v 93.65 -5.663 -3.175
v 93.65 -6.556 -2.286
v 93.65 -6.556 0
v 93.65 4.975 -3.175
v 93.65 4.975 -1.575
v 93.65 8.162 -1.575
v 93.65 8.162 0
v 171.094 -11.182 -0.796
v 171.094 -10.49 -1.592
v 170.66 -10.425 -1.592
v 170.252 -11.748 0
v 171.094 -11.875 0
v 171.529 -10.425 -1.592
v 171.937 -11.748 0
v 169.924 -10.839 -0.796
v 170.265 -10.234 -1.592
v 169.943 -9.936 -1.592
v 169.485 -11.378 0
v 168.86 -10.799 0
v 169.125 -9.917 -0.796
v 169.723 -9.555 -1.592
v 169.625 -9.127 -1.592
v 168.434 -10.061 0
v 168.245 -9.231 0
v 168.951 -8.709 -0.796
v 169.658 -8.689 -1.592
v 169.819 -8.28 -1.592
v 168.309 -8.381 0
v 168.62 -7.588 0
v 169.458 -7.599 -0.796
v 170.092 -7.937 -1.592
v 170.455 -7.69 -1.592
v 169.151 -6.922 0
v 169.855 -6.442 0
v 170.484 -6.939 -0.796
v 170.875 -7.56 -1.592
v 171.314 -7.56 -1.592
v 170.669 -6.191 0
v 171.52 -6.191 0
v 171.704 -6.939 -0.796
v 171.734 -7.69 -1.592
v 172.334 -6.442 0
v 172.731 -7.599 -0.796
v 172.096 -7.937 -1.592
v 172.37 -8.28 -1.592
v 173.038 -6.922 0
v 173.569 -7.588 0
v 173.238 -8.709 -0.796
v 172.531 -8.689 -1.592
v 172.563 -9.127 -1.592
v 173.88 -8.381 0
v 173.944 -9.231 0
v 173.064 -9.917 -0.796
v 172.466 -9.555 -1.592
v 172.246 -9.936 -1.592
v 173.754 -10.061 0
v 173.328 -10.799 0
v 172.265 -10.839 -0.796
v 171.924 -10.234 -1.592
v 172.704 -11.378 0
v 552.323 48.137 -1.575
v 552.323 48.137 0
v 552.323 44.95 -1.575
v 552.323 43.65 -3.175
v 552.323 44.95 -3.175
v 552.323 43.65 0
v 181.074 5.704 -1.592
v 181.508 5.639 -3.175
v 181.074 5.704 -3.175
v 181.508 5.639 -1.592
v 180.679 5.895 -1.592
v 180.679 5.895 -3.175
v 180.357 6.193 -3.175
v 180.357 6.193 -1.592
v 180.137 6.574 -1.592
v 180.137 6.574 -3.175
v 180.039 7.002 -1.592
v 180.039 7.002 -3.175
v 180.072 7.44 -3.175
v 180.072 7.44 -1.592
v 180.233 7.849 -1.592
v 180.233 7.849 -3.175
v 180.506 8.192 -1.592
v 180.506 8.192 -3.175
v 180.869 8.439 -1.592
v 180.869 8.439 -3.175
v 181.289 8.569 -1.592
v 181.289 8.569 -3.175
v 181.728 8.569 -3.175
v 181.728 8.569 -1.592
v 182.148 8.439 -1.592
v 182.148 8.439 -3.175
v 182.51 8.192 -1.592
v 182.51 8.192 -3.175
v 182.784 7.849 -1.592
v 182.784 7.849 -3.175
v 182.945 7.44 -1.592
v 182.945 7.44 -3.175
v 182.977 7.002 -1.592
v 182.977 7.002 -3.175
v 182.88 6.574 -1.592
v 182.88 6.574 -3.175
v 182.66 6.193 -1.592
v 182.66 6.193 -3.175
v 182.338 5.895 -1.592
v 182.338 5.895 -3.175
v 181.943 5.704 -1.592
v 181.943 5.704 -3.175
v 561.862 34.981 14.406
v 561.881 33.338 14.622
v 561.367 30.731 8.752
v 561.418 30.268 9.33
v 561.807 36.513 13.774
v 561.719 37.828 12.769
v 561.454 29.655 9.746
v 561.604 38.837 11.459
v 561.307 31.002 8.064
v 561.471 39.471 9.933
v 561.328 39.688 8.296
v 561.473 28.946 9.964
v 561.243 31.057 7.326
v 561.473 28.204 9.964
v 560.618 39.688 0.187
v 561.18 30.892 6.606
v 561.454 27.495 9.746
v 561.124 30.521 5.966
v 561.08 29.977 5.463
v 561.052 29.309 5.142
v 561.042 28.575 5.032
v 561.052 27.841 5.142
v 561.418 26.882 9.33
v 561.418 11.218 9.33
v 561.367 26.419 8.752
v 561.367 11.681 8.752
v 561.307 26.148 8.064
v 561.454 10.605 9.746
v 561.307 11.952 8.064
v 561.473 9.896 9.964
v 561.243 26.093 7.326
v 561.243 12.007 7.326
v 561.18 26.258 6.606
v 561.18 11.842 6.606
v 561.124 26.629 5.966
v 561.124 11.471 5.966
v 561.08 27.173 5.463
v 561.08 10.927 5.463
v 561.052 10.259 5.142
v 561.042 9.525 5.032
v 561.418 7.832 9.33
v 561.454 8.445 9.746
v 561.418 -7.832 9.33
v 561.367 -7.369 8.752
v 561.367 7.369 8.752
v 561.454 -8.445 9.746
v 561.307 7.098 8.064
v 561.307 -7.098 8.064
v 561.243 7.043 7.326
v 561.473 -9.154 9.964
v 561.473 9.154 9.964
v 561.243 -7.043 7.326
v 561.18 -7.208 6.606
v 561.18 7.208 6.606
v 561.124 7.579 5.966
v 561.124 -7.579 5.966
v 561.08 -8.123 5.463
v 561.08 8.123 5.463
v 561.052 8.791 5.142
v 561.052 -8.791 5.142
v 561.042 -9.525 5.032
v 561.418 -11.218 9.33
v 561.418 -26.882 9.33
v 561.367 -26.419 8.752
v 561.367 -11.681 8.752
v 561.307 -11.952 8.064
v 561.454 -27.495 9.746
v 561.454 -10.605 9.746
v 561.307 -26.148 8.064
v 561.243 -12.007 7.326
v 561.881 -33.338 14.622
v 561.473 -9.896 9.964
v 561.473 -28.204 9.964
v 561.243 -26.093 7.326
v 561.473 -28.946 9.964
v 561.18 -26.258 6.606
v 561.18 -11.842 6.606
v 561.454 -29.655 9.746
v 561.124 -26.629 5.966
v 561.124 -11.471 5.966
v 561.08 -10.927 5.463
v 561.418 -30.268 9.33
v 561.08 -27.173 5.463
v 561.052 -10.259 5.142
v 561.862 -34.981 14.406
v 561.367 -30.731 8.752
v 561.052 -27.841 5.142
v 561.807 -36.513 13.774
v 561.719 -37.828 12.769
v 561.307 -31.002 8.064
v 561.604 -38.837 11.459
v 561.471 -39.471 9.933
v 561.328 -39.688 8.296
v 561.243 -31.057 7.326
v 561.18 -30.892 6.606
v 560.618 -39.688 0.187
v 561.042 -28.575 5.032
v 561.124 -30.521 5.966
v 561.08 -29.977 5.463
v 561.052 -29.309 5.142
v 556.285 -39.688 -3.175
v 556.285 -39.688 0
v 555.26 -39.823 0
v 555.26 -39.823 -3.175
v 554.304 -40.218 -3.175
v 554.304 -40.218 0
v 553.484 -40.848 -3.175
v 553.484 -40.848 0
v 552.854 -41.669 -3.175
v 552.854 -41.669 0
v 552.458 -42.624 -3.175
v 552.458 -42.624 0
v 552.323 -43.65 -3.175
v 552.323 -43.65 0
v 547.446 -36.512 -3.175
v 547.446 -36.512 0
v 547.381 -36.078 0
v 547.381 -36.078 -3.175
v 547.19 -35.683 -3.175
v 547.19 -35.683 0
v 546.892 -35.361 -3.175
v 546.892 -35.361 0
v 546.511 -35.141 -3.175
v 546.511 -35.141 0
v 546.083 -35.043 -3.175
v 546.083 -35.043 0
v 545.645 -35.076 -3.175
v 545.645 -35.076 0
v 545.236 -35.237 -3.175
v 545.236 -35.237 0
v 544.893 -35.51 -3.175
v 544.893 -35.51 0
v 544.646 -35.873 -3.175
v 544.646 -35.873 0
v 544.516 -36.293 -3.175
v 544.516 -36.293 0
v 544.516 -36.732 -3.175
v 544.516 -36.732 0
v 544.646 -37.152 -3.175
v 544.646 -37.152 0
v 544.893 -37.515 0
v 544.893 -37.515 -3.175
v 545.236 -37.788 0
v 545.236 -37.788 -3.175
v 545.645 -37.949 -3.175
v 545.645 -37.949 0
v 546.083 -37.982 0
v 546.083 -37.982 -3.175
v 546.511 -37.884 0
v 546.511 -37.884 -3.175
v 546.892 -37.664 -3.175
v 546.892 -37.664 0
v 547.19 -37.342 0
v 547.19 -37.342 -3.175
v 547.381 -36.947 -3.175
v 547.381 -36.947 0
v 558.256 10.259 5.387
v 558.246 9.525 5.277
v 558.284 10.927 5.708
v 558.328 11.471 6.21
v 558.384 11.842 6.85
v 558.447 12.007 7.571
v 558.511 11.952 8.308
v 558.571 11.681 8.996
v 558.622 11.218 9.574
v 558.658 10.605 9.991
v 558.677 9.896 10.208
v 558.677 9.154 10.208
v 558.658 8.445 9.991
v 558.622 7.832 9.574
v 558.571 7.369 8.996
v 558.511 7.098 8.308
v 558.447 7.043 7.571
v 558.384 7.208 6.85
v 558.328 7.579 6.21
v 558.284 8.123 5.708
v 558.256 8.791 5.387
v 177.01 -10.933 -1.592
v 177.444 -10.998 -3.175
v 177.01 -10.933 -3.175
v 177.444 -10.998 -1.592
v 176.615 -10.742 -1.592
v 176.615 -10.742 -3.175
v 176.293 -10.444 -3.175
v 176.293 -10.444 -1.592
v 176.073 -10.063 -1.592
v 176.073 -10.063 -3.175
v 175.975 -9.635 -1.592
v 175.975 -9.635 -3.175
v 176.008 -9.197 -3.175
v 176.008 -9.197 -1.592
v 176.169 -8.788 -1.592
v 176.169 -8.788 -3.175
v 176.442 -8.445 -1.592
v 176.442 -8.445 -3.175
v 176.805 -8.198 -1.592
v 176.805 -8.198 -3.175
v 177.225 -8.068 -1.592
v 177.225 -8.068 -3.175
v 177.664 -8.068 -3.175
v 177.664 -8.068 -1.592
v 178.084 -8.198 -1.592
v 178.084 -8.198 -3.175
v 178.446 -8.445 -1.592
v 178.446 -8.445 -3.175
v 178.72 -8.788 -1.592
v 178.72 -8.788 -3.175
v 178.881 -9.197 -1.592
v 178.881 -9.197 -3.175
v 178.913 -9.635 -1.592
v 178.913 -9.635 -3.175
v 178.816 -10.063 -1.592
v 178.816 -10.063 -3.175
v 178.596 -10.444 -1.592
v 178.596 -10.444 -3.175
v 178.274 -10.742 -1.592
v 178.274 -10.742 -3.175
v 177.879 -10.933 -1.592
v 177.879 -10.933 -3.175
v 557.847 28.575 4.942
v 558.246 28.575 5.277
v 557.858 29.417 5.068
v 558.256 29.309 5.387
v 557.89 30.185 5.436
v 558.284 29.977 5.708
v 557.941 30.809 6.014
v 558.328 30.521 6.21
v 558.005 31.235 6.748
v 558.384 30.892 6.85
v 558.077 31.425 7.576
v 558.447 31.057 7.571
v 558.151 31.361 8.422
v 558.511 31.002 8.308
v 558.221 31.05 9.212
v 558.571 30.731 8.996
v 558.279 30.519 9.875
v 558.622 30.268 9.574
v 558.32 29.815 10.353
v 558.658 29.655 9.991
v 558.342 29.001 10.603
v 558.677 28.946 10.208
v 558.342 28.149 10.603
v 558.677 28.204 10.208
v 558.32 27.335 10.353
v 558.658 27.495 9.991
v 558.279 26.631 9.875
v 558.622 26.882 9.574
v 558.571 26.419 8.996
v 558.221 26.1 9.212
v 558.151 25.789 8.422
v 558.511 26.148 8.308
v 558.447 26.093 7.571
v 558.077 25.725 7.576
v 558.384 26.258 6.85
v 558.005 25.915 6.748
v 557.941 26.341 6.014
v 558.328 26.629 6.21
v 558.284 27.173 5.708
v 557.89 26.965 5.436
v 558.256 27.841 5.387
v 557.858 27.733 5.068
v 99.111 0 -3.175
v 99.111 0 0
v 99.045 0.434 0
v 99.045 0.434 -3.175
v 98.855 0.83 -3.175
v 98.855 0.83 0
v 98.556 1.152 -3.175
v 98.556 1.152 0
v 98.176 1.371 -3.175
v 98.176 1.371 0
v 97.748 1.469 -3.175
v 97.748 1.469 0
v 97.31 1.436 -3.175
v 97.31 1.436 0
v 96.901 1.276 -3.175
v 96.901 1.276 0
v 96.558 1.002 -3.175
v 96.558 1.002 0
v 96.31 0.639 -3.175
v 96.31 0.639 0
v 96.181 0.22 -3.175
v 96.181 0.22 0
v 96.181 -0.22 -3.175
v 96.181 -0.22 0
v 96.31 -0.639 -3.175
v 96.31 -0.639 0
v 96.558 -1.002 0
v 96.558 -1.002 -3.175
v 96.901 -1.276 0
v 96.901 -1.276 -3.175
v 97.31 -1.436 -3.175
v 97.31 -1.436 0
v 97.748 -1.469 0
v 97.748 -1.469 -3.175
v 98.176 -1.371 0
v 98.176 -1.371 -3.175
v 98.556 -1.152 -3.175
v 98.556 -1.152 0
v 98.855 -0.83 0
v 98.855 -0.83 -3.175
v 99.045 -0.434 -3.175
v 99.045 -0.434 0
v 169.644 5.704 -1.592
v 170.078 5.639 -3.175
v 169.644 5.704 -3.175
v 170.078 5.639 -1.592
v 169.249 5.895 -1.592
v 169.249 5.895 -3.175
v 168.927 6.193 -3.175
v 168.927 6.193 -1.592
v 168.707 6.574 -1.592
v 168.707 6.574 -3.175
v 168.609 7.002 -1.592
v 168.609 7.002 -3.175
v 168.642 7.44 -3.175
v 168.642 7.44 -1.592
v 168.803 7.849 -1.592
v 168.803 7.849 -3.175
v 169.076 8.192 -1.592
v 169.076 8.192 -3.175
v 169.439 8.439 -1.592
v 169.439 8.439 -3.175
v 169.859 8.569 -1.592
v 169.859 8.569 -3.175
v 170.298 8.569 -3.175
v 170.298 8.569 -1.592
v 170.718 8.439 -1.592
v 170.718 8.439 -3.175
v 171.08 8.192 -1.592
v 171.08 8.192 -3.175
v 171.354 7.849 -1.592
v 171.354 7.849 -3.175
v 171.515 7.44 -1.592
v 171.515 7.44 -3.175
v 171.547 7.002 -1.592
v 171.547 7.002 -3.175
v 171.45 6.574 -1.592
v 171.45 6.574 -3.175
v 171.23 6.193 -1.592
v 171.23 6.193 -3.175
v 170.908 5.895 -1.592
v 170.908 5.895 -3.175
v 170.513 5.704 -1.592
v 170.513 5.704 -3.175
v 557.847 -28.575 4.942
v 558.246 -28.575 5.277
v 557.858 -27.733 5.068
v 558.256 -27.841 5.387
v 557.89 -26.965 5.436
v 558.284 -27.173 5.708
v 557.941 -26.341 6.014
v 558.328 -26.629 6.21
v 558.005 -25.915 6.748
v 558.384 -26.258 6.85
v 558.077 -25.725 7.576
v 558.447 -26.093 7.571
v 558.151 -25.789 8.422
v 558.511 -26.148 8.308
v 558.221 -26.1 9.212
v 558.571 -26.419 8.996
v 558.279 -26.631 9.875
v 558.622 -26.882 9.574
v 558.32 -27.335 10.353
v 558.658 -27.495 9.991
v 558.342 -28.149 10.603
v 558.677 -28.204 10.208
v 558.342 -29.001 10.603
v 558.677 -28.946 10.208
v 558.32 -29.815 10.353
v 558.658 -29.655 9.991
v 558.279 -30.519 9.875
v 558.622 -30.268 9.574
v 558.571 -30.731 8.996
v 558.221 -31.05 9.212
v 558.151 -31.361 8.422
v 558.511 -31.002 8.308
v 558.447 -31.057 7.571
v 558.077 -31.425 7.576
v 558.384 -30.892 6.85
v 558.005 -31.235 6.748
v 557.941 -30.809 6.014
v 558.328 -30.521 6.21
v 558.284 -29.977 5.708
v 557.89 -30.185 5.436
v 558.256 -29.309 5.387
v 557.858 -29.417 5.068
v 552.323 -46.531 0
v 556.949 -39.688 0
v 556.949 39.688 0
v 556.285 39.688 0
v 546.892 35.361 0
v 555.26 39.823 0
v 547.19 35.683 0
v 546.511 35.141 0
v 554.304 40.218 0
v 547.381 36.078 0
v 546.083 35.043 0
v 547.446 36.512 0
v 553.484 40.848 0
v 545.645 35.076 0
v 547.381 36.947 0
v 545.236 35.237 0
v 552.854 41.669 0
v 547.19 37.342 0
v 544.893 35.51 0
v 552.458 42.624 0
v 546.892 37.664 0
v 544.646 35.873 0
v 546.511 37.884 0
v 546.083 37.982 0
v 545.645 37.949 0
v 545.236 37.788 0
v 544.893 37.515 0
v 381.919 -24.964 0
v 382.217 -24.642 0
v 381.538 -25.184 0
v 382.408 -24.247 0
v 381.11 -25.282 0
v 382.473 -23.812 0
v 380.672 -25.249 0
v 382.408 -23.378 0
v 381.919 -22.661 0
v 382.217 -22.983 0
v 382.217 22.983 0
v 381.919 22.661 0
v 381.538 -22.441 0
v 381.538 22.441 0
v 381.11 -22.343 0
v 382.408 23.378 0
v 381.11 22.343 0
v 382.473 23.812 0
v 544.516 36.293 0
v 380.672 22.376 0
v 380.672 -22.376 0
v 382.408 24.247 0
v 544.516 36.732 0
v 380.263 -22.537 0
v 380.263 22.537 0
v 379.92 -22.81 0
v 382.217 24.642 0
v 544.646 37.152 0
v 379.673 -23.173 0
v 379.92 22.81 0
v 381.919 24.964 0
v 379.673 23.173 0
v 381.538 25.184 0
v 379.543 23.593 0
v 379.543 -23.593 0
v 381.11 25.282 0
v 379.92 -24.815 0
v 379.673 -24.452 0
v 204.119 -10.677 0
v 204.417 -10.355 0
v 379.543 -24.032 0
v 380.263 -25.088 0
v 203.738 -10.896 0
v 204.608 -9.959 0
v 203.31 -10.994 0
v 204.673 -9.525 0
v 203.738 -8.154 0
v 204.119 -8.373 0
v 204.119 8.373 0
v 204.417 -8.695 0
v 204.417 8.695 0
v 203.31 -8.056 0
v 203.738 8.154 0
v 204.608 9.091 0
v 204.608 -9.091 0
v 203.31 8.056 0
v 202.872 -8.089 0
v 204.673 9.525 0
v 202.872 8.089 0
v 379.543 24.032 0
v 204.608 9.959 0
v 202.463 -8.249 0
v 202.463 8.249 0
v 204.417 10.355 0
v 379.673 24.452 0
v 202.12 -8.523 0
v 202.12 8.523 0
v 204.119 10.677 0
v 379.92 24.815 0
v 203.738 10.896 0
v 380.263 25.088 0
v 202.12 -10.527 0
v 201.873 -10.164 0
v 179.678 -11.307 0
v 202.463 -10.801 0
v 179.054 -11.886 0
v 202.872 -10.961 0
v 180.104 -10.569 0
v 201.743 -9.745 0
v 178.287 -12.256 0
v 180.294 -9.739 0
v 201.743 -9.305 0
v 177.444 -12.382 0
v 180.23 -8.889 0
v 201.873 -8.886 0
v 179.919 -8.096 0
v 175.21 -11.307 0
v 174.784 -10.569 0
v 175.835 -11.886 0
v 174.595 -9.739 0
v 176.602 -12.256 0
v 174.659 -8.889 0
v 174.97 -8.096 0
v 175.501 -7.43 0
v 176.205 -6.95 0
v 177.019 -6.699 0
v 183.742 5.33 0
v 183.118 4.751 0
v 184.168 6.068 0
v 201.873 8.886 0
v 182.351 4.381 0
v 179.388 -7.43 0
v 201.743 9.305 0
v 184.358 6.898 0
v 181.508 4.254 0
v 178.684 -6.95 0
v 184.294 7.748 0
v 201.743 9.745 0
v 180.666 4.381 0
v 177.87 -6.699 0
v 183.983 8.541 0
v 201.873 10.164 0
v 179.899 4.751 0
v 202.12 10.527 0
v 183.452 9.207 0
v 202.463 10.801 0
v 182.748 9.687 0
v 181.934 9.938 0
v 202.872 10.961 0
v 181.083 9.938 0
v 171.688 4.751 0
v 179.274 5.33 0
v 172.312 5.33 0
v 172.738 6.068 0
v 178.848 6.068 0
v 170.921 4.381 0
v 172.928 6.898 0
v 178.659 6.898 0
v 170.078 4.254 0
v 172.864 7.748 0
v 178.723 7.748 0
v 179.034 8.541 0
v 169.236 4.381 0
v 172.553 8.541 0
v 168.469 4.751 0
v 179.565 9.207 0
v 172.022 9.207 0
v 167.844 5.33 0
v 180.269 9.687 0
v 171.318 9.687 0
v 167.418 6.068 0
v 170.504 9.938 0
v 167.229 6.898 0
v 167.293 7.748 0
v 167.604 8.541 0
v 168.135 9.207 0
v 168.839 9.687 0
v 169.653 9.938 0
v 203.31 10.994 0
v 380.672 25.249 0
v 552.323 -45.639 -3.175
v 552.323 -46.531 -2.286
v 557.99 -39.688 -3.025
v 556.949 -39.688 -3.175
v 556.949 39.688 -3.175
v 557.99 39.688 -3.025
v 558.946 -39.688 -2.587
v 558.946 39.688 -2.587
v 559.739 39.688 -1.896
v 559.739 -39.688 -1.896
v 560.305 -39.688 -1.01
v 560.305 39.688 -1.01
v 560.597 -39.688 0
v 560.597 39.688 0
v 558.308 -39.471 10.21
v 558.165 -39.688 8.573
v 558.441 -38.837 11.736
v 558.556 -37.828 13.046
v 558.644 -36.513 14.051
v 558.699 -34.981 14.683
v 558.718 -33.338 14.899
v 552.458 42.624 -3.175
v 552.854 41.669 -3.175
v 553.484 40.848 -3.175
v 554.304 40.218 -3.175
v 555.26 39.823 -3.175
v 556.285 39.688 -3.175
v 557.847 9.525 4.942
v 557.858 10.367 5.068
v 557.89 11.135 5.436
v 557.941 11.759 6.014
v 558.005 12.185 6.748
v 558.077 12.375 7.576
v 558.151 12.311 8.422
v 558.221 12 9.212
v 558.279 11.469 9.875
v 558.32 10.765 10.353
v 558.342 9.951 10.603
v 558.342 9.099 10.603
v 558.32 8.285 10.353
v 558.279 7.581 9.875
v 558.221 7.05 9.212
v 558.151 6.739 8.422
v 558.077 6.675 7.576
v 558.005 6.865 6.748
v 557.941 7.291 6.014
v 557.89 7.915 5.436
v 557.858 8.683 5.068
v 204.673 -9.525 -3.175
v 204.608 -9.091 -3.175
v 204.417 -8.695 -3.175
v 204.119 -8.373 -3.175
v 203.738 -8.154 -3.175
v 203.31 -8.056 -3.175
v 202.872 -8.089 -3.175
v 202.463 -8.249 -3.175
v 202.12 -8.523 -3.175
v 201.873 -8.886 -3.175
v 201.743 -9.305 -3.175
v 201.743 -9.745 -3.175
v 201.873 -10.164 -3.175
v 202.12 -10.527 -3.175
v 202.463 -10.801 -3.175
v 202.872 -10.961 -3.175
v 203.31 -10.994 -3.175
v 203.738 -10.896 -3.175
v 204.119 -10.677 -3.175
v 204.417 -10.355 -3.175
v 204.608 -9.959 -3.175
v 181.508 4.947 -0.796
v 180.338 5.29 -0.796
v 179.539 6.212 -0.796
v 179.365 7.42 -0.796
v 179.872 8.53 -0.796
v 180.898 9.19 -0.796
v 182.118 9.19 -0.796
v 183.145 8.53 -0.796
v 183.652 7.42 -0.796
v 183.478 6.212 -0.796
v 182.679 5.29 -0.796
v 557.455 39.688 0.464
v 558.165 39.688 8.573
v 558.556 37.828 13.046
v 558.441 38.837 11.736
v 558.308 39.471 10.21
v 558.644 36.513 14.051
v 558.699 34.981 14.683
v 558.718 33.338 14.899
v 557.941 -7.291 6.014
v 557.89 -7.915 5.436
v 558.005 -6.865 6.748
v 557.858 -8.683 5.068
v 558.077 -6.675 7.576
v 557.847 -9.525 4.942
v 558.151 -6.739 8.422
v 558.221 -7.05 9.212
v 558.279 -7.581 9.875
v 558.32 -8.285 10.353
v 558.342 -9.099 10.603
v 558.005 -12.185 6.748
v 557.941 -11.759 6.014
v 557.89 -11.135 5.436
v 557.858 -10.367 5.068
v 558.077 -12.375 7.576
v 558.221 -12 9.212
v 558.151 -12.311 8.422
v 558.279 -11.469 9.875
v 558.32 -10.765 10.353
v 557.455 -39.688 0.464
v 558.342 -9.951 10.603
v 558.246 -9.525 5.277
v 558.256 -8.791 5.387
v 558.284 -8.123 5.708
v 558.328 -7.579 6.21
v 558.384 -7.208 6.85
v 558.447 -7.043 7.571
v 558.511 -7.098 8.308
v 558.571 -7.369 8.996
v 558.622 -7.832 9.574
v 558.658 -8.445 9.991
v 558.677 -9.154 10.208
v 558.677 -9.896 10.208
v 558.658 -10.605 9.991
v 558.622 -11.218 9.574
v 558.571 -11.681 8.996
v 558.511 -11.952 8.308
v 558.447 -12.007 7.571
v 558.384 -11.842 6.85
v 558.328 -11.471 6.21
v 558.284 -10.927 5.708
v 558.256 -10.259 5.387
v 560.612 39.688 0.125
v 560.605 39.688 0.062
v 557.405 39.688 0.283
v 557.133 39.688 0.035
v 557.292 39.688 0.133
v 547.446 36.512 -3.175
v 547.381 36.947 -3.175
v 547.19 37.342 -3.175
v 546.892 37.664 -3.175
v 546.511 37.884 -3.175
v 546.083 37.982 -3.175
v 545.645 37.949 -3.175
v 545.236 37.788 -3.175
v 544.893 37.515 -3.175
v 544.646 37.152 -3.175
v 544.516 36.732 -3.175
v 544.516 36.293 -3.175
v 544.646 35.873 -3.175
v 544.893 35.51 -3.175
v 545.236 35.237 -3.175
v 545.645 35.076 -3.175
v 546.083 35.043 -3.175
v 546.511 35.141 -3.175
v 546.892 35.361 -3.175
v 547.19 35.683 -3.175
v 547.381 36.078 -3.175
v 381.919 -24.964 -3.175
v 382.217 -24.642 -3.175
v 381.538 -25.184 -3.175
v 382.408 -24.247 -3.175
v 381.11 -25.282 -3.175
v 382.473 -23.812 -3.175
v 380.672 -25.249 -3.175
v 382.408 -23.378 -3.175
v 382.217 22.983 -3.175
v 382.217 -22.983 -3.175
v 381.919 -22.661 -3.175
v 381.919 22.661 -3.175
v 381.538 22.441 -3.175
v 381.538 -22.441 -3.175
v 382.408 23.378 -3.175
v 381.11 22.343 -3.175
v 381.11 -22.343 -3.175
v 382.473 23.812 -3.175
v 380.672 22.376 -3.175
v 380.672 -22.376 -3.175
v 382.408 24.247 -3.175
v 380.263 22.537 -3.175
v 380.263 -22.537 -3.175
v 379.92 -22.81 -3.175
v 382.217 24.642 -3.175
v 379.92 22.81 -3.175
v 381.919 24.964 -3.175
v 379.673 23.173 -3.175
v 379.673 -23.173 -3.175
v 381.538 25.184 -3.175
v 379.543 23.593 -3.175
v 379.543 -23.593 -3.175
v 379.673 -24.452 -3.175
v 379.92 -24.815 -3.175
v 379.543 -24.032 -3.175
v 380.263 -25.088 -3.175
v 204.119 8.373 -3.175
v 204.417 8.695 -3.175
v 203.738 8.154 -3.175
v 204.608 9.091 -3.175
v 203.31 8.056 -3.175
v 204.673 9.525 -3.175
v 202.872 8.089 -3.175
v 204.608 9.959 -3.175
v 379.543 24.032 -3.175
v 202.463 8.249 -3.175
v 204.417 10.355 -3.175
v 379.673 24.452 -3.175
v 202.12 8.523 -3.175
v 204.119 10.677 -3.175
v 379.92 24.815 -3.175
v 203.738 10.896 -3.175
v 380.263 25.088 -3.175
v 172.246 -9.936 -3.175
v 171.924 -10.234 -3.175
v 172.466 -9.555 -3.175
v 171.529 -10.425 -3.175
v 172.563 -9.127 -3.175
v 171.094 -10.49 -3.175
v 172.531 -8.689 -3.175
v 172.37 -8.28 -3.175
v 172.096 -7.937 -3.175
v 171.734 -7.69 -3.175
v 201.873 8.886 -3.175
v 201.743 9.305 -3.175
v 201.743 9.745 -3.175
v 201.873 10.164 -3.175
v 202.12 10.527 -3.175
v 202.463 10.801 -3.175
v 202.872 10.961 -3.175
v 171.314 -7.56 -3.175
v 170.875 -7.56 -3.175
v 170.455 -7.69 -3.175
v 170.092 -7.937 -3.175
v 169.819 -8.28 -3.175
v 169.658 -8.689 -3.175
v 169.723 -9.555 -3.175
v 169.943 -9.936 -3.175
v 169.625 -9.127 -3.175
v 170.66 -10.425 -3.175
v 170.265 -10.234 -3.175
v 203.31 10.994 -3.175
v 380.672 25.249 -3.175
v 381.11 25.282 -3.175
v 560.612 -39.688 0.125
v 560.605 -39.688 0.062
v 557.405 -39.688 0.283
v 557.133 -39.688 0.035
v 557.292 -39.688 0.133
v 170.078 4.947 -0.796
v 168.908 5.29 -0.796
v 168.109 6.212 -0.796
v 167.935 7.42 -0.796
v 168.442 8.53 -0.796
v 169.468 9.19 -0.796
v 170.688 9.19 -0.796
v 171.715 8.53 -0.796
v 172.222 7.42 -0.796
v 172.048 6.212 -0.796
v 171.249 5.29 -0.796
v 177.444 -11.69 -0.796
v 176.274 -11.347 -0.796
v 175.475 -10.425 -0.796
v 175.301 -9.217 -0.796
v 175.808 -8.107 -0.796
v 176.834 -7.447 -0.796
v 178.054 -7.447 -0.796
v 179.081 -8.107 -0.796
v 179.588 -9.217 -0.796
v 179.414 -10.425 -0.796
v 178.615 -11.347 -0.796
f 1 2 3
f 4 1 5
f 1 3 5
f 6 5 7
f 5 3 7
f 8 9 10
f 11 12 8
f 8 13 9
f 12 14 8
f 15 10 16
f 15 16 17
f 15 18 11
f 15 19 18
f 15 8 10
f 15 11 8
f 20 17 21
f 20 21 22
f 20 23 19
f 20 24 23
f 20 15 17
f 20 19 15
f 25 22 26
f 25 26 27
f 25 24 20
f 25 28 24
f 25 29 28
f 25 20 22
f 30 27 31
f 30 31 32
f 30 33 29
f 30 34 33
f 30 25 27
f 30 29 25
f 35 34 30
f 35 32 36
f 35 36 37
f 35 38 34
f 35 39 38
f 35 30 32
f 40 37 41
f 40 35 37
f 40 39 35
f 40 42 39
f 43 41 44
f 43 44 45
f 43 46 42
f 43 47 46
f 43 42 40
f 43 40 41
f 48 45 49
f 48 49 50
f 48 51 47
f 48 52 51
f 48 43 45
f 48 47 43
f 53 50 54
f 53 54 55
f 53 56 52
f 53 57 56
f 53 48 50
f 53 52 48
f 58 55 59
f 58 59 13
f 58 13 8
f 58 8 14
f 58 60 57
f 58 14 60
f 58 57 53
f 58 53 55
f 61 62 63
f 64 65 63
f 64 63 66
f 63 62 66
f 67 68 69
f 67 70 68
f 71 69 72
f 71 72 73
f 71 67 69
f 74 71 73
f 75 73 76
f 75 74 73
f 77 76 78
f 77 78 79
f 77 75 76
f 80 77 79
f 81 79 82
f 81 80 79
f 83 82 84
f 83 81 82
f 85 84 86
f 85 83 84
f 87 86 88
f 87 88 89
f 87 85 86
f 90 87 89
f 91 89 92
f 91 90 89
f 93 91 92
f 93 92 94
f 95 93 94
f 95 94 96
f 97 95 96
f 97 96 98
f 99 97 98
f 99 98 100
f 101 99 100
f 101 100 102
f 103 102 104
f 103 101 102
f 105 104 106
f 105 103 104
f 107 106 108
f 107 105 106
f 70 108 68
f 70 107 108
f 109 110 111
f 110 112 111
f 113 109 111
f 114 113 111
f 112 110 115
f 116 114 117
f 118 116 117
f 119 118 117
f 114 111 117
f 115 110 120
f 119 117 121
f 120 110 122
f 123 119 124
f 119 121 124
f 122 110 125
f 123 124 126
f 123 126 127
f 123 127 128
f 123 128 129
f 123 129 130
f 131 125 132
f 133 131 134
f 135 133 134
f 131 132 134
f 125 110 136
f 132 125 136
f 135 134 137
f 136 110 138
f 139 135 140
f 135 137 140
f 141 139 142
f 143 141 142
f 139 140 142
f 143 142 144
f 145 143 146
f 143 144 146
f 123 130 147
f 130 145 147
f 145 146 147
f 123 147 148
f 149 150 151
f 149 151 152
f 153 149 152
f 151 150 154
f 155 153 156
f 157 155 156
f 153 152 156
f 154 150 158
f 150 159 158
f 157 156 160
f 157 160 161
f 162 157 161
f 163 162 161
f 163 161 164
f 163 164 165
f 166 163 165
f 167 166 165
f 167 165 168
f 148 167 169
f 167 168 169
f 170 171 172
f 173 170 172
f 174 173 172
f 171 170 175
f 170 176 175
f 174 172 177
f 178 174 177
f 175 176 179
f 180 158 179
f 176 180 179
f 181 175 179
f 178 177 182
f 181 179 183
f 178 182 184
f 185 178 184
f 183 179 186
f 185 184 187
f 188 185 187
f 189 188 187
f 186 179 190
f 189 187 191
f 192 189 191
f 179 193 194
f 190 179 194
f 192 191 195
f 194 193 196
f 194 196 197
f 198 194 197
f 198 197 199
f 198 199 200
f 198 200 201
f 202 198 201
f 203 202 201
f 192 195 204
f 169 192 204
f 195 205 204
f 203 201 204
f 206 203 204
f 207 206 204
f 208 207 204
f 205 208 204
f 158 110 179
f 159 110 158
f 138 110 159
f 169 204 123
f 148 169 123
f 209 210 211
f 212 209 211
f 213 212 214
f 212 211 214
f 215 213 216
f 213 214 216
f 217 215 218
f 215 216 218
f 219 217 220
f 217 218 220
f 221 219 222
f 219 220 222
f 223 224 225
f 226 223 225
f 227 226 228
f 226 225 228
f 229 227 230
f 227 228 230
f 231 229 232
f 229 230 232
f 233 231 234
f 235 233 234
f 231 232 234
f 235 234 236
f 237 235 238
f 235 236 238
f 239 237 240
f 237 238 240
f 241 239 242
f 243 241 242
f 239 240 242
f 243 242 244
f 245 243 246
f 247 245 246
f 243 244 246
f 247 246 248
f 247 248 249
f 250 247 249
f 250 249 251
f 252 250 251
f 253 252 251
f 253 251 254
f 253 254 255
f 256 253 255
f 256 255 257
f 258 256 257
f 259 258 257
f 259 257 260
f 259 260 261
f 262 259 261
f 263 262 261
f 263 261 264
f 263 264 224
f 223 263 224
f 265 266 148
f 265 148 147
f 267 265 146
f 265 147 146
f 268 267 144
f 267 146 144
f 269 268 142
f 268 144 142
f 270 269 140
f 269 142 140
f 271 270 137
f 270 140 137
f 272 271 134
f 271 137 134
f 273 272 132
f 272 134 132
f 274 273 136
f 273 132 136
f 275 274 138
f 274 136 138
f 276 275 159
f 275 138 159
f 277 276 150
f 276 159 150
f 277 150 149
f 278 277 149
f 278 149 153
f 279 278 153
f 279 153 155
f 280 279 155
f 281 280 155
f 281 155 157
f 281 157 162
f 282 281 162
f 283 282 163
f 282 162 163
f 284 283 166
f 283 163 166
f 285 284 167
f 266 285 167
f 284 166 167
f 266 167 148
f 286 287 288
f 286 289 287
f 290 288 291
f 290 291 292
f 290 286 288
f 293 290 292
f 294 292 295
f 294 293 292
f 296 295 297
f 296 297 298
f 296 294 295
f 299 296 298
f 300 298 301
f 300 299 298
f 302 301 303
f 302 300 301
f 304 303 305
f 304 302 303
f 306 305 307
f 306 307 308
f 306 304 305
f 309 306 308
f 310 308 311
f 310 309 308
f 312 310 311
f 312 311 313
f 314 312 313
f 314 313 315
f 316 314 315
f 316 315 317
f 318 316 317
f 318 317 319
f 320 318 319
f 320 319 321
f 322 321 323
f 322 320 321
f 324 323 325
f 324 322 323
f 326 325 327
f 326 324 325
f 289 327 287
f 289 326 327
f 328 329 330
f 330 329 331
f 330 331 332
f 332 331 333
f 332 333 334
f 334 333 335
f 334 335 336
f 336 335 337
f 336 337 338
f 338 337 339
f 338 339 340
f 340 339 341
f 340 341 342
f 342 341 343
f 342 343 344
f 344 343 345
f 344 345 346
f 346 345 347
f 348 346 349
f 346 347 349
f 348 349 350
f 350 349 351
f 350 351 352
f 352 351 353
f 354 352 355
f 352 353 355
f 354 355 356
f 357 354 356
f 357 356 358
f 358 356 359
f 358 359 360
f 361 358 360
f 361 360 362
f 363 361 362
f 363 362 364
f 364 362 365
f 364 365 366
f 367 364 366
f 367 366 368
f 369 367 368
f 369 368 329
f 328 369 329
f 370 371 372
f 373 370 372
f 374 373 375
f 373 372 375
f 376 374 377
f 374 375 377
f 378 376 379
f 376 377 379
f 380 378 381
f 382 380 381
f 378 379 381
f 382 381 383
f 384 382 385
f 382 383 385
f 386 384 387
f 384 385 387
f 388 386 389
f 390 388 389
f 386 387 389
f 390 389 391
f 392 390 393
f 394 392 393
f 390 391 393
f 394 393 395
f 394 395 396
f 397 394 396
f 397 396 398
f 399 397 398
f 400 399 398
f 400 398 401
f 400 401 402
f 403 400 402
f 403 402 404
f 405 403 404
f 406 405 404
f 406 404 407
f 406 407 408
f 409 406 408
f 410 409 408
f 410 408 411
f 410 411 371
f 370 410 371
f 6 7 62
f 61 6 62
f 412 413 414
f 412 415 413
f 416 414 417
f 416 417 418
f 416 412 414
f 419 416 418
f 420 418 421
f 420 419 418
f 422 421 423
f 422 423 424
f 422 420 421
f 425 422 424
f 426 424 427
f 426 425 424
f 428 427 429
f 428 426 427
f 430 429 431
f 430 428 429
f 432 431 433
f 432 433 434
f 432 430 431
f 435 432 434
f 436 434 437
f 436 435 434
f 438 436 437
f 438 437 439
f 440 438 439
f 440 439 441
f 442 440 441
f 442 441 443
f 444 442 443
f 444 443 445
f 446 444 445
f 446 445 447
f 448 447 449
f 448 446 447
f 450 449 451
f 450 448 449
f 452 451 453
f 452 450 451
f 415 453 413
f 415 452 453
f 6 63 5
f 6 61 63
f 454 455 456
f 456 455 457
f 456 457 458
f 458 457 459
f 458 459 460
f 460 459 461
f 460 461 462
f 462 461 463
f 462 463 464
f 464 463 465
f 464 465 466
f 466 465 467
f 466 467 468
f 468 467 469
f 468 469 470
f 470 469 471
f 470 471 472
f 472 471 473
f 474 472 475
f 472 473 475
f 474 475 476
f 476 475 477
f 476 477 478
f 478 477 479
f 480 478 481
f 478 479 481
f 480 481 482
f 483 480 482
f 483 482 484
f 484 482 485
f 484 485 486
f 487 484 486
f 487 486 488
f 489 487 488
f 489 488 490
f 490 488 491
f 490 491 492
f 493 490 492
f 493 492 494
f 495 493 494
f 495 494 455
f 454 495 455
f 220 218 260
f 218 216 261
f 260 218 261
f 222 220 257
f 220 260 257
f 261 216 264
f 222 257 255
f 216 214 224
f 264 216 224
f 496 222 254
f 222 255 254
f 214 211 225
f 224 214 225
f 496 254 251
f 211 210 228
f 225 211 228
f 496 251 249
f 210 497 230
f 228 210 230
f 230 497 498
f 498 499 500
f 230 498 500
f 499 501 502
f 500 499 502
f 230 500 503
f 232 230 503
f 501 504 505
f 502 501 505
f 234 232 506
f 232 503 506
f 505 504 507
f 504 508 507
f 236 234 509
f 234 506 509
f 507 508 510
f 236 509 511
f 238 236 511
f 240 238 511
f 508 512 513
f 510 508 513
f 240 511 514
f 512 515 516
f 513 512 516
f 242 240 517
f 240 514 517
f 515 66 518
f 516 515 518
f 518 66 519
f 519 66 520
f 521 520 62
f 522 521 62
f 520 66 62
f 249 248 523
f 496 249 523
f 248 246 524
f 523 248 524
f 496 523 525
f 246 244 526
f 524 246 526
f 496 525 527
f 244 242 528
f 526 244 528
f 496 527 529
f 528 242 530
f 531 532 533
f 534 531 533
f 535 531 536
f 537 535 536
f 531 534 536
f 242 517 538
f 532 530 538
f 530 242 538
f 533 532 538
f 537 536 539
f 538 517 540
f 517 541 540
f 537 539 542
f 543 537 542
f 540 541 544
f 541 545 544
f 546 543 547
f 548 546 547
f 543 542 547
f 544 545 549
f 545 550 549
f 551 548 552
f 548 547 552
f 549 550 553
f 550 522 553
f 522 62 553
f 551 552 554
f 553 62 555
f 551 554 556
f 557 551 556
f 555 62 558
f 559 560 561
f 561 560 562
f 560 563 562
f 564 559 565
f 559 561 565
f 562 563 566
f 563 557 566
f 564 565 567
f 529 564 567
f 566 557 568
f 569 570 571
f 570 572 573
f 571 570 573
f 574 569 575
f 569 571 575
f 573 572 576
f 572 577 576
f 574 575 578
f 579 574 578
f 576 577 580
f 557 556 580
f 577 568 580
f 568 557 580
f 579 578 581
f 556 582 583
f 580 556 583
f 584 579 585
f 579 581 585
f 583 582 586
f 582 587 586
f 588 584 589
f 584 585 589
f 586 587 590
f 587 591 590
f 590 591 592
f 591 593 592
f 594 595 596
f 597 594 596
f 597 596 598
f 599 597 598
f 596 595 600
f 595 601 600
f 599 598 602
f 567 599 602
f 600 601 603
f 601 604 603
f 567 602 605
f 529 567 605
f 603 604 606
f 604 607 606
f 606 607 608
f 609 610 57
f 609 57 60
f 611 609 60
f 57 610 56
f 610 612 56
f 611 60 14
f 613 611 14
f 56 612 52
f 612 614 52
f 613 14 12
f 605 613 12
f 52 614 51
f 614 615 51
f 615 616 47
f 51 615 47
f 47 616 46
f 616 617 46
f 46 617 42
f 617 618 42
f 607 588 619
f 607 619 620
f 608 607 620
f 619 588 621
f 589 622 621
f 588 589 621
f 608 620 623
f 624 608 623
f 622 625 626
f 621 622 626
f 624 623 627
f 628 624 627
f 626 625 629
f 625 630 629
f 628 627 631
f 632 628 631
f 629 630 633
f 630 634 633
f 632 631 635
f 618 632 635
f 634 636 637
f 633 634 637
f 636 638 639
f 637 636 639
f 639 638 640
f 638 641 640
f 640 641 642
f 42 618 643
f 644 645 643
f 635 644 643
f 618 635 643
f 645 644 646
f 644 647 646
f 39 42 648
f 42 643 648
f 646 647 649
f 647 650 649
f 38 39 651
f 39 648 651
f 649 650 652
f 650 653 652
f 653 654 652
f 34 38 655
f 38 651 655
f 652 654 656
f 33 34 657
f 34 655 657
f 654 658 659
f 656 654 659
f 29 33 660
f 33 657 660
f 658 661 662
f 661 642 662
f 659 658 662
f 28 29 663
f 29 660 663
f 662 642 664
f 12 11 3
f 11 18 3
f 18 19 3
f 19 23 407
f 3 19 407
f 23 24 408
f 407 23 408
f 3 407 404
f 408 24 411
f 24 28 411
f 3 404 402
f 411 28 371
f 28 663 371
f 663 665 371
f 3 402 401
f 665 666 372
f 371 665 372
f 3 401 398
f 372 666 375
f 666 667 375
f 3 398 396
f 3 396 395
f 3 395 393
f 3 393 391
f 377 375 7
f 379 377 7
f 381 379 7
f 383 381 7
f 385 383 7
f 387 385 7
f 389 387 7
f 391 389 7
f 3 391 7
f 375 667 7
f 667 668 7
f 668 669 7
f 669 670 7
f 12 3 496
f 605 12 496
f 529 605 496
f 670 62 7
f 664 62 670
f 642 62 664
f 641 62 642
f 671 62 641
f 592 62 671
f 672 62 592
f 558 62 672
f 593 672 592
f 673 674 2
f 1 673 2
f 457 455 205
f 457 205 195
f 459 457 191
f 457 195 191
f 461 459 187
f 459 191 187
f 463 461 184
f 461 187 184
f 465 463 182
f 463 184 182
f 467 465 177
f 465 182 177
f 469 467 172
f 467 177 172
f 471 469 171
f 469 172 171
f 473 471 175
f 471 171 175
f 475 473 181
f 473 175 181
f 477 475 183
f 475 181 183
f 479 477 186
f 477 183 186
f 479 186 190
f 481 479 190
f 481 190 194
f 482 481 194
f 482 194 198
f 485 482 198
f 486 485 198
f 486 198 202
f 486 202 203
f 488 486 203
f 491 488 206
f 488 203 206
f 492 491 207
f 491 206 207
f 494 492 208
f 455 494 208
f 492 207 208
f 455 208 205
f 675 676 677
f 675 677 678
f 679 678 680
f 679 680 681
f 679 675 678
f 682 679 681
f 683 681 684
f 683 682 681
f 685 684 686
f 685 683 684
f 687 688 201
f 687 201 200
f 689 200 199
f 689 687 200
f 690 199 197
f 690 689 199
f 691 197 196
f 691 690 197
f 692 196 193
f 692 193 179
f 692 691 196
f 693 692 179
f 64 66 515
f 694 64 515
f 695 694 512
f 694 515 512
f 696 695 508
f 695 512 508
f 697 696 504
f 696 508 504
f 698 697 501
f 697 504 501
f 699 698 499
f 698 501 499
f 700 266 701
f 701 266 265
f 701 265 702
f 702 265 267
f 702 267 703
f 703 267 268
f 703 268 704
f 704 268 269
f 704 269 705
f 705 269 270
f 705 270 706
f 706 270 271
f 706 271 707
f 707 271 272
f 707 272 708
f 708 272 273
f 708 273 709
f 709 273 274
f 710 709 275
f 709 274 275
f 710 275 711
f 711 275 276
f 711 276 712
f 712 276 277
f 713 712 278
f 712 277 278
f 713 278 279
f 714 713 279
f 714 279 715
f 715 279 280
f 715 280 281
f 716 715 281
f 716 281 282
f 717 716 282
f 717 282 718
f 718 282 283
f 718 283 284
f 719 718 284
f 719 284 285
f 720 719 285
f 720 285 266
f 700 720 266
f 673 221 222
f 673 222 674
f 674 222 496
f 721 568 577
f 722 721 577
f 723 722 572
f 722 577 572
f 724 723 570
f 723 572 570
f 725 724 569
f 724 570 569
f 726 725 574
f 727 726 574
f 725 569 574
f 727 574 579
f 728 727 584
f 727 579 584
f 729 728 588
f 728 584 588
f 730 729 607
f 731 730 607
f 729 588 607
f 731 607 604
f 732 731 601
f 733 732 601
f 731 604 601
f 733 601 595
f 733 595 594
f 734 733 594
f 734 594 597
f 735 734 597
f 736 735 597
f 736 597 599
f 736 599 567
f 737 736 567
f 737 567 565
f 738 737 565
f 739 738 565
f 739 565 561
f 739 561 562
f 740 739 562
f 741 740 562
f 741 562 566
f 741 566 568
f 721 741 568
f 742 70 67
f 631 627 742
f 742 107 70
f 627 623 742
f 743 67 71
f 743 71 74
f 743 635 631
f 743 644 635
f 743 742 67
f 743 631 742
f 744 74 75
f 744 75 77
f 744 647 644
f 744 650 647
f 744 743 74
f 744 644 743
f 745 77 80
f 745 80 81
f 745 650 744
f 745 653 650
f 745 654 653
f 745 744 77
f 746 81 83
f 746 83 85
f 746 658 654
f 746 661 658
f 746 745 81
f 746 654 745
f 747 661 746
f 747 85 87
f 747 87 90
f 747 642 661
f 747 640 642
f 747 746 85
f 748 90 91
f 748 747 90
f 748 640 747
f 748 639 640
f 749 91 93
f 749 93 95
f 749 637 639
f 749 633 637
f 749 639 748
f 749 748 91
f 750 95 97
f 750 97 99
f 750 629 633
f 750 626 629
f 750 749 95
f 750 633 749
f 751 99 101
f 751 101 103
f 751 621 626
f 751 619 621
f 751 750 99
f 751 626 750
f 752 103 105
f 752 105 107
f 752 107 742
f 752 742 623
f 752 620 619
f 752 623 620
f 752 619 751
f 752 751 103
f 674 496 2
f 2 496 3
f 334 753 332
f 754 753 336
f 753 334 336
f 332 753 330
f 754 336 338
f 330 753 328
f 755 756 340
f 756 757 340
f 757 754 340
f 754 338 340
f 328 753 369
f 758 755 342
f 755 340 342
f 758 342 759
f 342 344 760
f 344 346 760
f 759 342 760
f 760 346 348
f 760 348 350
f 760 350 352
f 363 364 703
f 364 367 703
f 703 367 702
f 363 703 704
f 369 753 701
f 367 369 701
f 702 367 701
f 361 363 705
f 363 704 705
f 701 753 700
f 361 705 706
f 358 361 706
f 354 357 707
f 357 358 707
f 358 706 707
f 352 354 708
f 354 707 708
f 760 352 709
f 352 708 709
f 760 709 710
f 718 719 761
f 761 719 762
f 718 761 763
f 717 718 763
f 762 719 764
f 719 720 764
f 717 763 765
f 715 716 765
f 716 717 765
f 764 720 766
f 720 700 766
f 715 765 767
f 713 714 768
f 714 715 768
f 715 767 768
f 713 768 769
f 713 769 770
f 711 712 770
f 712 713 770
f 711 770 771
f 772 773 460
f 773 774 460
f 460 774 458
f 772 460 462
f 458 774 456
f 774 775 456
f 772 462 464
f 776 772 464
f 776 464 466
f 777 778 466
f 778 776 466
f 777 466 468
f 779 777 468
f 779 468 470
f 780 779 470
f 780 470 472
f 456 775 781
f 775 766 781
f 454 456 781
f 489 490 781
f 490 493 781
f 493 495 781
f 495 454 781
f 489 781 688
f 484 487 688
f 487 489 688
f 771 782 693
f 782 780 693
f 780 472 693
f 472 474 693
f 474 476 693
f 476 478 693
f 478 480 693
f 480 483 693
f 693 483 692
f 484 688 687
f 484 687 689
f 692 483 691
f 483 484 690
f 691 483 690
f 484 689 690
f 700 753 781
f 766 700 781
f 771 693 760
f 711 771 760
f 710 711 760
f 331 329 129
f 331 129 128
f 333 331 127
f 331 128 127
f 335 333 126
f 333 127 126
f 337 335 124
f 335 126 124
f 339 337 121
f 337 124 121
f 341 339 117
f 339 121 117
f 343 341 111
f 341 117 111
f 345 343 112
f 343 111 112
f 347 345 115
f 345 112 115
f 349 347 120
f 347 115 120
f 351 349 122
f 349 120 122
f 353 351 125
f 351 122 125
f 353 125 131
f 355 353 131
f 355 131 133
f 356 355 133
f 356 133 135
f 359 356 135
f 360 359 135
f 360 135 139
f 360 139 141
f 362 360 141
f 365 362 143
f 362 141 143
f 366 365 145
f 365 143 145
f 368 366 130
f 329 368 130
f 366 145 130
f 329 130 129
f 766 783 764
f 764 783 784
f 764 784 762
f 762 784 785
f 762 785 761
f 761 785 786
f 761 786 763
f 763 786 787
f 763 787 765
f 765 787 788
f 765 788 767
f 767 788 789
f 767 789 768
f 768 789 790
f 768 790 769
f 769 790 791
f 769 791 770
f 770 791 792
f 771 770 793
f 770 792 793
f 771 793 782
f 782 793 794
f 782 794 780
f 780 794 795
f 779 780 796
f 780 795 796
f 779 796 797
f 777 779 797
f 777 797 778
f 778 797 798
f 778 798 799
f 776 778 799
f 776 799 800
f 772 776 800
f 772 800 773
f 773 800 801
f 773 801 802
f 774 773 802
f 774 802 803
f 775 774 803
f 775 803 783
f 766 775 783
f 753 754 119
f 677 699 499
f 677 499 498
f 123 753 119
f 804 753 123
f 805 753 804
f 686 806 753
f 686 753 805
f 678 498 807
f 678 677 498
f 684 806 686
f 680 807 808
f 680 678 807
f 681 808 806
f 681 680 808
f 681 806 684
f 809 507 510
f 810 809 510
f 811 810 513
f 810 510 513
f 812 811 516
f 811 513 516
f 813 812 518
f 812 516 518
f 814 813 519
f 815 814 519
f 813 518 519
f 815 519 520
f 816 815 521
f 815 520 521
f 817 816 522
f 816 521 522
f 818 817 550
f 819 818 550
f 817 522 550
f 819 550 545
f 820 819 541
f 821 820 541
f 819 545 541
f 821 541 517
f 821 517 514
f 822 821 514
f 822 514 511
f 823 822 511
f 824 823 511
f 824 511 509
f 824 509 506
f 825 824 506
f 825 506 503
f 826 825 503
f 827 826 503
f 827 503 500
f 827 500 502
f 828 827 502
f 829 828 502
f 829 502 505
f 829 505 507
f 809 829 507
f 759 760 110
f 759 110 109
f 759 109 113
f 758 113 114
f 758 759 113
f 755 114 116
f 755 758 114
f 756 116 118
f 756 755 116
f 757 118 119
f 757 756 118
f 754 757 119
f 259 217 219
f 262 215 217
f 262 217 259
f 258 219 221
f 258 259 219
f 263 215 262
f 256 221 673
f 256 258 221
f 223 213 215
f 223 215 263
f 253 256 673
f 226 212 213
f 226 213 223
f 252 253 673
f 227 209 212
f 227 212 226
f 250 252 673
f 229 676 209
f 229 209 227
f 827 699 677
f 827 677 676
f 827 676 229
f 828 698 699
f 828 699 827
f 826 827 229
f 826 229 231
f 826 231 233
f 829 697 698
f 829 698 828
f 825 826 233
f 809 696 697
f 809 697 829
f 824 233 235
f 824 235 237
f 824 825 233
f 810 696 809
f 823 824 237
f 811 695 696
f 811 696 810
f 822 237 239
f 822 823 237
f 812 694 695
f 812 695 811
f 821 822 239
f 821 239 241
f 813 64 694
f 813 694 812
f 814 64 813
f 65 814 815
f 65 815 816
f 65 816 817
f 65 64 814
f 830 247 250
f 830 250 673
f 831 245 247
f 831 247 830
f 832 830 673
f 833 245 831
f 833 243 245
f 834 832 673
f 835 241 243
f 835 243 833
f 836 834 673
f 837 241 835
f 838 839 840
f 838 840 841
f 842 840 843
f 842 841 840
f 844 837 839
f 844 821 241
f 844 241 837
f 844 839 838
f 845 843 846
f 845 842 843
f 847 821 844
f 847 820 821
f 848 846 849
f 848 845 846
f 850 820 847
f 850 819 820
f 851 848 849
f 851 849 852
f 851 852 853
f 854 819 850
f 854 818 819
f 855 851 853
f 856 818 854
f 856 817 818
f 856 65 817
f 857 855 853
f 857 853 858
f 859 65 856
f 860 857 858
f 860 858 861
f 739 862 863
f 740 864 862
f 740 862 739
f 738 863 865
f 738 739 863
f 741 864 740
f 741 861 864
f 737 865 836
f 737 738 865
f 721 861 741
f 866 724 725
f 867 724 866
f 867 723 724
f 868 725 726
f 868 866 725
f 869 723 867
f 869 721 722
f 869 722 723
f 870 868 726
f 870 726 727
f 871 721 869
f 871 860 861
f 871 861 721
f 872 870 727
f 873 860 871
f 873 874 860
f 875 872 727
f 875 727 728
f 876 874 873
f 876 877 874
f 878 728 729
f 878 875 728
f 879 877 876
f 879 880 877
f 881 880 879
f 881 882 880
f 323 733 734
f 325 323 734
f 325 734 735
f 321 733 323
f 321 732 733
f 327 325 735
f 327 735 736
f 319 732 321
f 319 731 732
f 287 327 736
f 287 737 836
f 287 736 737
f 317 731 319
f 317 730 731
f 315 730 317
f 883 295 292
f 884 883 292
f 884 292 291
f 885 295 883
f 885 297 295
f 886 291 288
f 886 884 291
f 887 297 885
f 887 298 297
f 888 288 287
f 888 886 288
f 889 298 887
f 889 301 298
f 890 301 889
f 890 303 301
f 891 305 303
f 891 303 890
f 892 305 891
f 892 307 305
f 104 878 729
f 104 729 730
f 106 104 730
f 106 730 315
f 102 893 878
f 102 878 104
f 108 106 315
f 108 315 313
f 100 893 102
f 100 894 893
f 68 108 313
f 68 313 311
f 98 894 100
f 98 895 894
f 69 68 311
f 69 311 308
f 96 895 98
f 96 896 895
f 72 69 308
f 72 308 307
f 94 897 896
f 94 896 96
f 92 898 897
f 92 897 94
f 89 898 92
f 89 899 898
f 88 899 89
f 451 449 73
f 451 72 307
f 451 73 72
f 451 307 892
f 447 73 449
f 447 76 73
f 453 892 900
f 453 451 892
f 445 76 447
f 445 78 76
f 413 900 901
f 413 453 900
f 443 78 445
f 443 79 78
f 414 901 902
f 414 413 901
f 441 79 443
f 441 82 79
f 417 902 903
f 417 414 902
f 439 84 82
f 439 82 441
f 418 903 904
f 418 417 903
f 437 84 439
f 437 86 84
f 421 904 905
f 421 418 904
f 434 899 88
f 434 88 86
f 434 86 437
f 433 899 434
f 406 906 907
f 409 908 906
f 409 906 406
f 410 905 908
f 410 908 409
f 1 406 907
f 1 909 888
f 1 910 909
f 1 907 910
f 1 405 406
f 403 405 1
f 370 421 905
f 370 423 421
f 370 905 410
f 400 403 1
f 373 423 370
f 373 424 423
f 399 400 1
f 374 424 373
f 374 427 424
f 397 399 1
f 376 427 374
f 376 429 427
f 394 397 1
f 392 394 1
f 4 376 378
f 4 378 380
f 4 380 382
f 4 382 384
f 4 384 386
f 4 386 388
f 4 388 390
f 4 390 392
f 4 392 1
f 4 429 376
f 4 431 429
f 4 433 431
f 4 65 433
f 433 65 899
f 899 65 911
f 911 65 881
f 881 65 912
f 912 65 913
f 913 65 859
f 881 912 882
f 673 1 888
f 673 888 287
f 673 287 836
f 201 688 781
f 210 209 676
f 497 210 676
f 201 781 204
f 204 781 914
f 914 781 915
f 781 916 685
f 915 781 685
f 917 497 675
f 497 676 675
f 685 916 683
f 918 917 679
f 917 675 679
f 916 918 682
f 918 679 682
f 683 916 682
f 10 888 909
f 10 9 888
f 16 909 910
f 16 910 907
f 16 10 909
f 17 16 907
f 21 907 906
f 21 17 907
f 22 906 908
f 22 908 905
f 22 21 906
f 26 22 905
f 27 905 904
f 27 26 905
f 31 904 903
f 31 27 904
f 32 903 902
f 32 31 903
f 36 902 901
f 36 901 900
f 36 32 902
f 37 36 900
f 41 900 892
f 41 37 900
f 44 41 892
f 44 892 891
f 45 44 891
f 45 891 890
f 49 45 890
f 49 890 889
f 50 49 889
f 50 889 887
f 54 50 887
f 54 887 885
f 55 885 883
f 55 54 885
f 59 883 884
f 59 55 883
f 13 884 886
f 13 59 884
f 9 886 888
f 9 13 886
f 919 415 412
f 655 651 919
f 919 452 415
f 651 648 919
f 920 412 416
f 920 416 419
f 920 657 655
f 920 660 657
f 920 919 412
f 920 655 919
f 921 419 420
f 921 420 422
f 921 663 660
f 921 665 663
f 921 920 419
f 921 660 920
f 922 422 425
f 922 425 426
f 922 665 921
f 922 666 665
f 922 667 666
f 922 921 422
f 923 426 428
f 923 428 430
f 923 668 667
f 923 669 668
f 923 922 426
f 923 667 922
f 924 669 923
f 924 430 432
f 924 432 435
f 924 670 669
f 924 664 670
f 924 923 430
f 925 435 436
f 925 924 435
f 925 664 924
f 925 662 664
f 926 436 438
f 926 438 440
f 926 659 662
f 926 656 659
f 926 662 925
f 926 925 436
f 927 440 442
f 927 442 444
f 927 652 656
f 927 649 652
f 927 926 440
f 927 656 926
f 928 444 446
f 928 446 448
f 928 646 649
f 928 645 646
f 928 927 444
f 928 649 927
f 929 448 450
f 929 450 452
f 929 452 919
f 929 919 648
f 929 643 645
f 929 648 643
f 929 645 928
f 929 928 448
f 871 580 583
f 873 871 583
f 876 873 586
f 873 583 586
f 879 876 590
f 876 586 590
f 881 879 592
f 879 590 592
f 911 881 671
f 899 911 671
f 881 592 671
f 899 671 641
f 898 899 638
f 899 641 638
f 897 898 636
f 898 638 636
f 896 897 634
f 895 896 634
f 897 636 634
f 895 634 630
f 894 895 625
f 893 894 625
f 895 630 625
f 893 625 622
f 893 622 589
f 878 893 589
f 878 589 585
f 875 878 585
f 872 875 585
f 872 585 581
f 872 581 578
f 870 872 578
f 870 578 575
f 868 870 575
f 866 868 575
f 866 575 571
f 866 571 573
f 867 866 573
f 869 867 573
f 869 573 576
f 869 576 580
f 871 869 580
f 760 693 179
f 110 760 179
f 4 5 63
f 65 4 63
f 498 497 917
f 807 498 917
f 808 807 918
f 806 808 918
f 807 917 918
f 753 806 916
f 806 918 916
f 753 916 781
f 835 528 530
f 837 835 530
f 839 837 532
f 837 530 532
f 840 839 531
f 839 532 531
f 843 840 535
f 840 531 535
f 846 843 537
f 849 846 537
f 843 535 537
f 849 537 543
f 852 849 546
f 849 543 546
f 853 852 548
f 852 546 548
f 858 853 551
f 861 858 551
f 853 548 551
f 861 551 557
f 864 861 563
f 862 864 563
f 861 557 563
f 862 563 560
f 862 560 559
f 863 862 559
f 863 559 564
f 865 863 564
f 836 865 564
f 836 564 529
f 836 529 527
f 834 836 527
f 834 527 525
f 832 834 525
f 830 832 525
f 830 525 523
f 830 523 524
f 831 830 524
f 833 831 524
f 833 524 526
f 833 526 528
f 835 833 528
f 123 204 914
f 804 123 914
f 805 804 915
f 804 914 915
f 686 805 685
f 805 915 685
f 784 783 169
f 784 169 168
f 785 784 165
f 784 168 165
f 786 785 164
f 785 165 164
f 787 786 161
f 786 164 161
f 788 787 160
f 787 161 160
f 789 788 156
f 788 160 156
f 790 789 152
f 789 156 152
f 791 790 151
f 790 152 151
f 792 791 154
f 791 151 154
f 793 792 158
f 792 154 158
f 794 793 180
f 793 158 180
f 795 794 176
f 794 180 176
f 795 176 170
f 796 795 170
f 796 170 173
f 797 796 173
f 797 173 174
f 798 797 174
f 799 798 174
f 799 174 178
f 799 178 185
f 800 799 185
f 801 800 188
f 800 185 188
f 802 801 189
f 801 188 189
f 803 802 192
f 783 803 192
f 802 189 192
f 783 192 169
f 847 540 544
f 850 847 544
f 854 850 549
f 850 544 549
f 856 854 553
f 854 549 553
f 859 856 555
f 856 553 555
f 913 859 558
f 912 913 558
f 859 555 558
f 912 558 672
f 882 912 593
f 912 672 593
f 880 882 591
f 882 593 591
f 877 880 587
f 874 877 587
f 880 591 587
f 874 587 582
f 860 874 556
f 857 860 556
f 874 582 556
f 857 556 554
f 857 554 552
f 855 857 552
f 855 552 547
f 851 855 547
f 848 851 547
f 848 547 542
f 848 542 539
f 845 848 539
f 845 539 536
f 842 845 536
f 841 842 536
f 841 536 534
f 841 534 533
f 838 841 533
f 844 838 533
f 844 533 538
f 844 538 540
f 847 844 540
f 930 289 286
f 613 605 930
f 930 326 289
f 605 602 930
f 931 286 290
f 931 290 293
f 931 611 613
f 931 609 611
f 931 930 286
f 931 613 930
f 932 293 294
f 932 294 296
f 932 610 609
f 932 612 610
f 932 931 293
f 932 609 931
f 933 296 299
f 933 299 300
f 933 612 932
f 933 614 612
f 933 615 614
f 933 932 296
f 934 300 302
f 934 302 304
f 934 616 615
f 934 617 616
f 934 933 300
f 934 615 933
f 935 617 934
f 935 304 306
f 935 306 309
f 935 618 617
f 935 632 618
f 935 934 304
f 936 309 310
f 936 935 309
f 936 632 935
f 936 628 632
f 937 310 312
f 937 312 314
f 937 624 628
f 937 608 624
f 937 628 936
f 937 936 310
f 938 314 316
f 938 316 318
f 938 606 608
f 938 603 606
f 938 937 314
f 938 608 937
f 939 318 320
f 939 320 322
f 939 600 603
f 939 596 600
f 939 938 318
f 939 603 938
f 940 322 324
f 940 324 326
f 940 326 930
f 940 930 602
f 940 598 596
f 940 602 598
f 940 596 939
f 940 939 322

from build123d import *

# Parameters (mm, degrees)
BASE_FLANGE1_DEPTH                            = 3.175
SKETCHED_START                                = -39.6875
SKETCHED_BEND2_DEPTH                          = 79.375
SKETCHED_BEND2_2_DEPTH                        = 79.375
SKETCHED_START_2                              = 554.168566106
SKETCHED_BEND2_3_DEPTH                        = 4.831433894
EXTRUDE3_DEPTH                                = 1.5748
F_9_0_196_DIAMETER_HOLE1_D                    = 4.9784
F_9_0_196_DIAMETER_HOLE1_CSINK_D              = 5.715
F_9_0_196_DIAMETER_HOLE1_CSINK_ANGLE          = 90
CHAMFER1_SIZE                                 = 0.889
F_0_116_DIAMETER_HOLE1_D                      = 2.9464
CSK_FOR_4_FLAT_HEAD_MACHINE_SCREW1_AT_2_COUNT = 2
CSK_FOR_4_FLAT_HEAD_MACHINE_SCREW1_AT_2_PITCH = 16.160968319
CSK_FOR_4_FLAT_HEAD_MACHINE_SCREW1_AT_3_COUNT = 2
CSK_FOR_4_FLAT_HEAD_MACHINE_SCREW1_AT_3_PITCH = 11.43
CSK_FOR_4_FLAT_HEAD_MACHINE_SCREW1_AT_4_COUNT = 2
CSK_FOR_4_FLAT_HEAD_MACHINE_SCREW1_AT_4_PITCH = 18.194716953


with BuildPart() as part:
    # Base-Flange1: sheet metal written as solids
    # Sketch1 → Base-Flange1 (new body)
    with BuildSketch(Plane.XY):
        with BuildLine():
            Line((93.6498, 4.974967896), (552.323, 44.950411579))
            Line((552.323, 44.950411579), (552.323, 43.6499))
            ThreePointArc((552.323, 43.6499), (553.48356009, 40.84806009), (556.2854, 39.6875))
            Line((556.2854, 39.6875), (568.198, 39.6875))
            ThreePointArc((568.198, 39.6875), (572.688128061, 37.827628061), (574.548, 33.3375))
            Line((574.548, 33.3375), (574.548, -33.3375))
            ThreePointArc((574.548, -33.3375), (572.688128061, -37.827628061), (568.198, -39.6875))
            Line((568.198, -39.6875), (556.2854, -39.6875))
            ThreePointArc((556.2854, -39.6875), (553.48356009, -40.84806009), (552.323, -43.6499))
            Line((552.323, -43.6499), (552.323, -46.531181284))
            Line((552.323, -46.531181284), (93.6498, -6.555737601))
            Line((93.6498, -6.555737601), (93.6498, 4.974967896))
        make_face()
    extrude(amount=-BASE_FLANGE1_DEPTH)

    # Sketched Bend2: read off the stored shape, not the designer's step
    # Sketched Bend2 outline → Sketched Bend2 (cut)
    with BuildSketch(Plane(origin=(0, 0, 0), x_dir=(1, 0, 0), z_dir=(0, 1, 0)).offset(SKETCHED_START)):
        with BuildLine():
            ThreePointArc((556.949152286, 3.175), (559.367160247, 2.270079642), (560.596949567, 0))
            Line((560.596949567, 0), (574.548, 0))
            Line((574.548, 0), (574.548, 3.175))
            Line((574.548, 3.175), (556.949152286, 3.175))
        make_face()
    extrude(amount=SKETCHED_BEND2_DEPTH, mode=Mode.SUBTRACT)

    # Sketched Bend2 2 outline → Sketched Bend2 2 (add)
    with BuildSketch(Plane(origin=(0, 0, 0), x_dir=(1, 0, 0), z_dir=(0, 1, 0)).offset(SKETCHED_START)):
        with BuildLine():
            Line((557.455219193, -0.463724883), (558.718115569, -14.89869652))
            Line((558.718115569, -14.89869652), (561.881033736, -14.621977036))
            Line((561.881033736, -14.621977036), (560.618137359, -0.187005399))
            ThreePointArc((560.618137359, -0.187005399), (560.608738158, -0.09336734), (560.596949567, 0))
            Line((560.596949567, 0), (556.949152286, 0))
            ThreePointArc((556.949152286, 0), (557.292352112, -0.133463113), (557.455219193, -0.463724883))
        make_face()
    extrude(amount=SKETCHED_BEND2_2_DEPTH)

    # Sketched Bend2 3 outline → Sketched Bend2 3 (cut)
    with BuildSketch(Plane(origin=(0, 0, 0), x_dir=(0, 1, 0), z_dir=(0.9961946980917459, 0, -0.0871557427476548)).offset(SKETCHED_START_2)):
        with BuildLine():
            Line((39.6875, 63.537494831), (33.3375, 63.53749483))
            ThreePointArc((33.3375, 63.53749483), (37.827628061, 61.677622891), (39.6875, 57.18749483))
            Line((39.6875, 57.18749483), (39.6875, 63.537494831))
        make_face()
        with BuildLine():
            ThreePointArc((-39.6875, 57.18749483), (-37.827628061, 61.677622891), (-33.3375, 63.53749483))
            Line((-33.3375, 63.53749483), (-39.6875, 63.537494831))
            Line((-39.6875, 63.537494831), (-39.6875, 57.18749483))
        make_face()
    extrude(amount=SKETCHED_BEND2_3_DEPTH, mode=Mode.SUBTRACT)

    # Sketch6 → Extrude3 (add)
    with BuildSketch(Plane.XY):
        Polygon((93.6498, 2.425339339), (93.6498, 8.162003592), (552.323, 48.137447275), (552.323, 42.400783022), align=None)
    extrude(amount=-EXTRUDE3_DEPTH)

    # #9 (0.196) Diameter Hole1 (through all)
    with Locations(Plane(origin=(553.180458015, 0, -48.39701896), x_dir=(0.08715574274765482, 0, 0.9961946980917459), z_dir=(-0.9961946980917459, 0, 0.08715574274765482))):
        with Locations((56.40009483, 9.525), (56.40009483, 28.575), (56.40009483, -28.575), (56.40009483, -9.525)):
            CounterSinkHole(F_9_0_196_DIAMETER_HOLE1_D / 2, F_9_0_196_DIAMETER_HOLE1_CSINK_D / 2, counter_sink_angle=F_9_0_196_DIAMETER_HOLE1_CSINK_ANGLE)

    # Chamfer1
    chamfer1_edges = [part.edges().sort_by_distance(p)[0] for p in [
        (322.9864, -26.543459443, -3.175),
    ]]
    chamfer(chamfer1_edges, length=CHAMFER1_SIZE)

    # 0.116_ Diameter Hole1 (through all)
    with Locations(Plane(origin=(0, 0, -3.175), x_dir=(-1, 0, 0), z_dir=(0, 0, -1))):
        with Locations((-381, 23.8125), (-381, -23.8125), (-203.2, 9.525), (-203.2, -9.525), (-97.6376, 0), (-545.973, 36.5125), (-545.973, -36.5125)):
            Hole(F_0_116_DIAMETER_HOLE1_D / 2)

    # Sketch15 → CSK for #4 Flat Head Machine Screw1 (revolve, cut)
    with BuildSketch(Plane(origin=(170.0784, 7.112, 0), x_dir=(0, -1, 0), z_dir=(1, 0, 0))):
        Polygon((0, 0), (0, 3.175), (1.4732, 3.175), (1.4732, 1.592454986), (2.8575, 0), align=None)
    csk_for_4_flat_head_machine_screw1 = revolve(axis=Axis((170.0784, 7.112, 6.35), (0, 0, -1)), mode=Mode.SUBTRACT)

    # CSK for #4 Flat Head Machine Screw1 at 2: CSK for #4 Flat Head Machine Screw1 ×2
    with Locations(*[Vector(0.06286752006193388, -0.998021880983209, 0) * (i * CSK_FOR_4_FLAT_HEAD_MACHINE_SCREW1_AT_2_PITCH) for i in range(1, CSK_FOR_4_FLAT_HEAD_MACHINE_SCREW1_AT_2_COUNT)]):
        add(csk_for_4_flat_head_machine_screw1, mode=Mode.SUBTRACT)

    # CSK for #4 Flat Head Machine Screw1 at 3: CSK for #4 Flat Head Machine Screw1 ×2
    with Locations(*[(i * CSK_FOR_4_FLAT_HEAD_MACHINE_SCREW1_AT_3_PITCH, 0, 0) for i in range(1, CSK_FOR_4_FLAT_HEAD_MACHINE_SCREW1_AT_3_COUNT)]):
        add(csk_for_4_flat_head_machine_screw1, mode=Mode.SUBTRACT)

    # CSK for #4 Flat Head Machine Screw1 at 4: CSK for #4 Flat Head Machine Screw1 ×2
    with Locations(*[Vector(0.4048427914006695, -0.9143863047153069, 0) * (i * CSK_FOR_4_FLAT_HEAD_MACHINE_SCREW1_AT_4_PITCH) for i in range(1, CSK_FOR_4_FLAT_HEAD_MACHINE_SCREW1_AT_4_COUNT)]):
        add(csk_for_4_flat_head_machine_screw1, mode=Mode.SUBTRACT)


solid = part.part
